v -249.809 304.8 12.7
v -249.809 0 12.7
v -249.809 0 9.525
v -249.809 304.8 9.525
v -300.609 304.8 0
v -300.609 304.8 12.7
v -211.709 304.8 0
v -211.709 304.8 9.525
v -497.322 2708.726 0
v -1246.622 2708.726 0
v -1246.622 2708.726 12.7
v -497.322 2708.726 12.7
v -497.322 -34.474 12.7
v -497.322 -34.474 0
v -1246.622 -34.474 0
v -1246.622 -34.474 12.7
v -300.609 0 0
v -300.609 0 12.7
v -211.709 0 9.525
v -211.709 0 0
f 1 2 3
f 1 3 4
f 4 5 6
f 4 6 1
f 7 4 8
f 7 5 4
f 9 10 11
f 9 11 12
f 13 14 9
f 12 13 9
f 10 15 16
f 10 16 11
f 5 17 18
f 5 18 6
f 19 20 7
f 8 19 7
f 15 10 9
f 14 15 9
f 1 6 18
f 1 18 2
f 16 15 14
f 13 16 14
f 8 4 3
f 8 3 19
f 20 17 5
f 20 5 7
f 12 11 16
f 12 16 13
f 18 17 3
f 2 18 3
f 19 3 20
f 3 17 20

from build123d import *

# Parameters (mm, degrees)
F0_W     = 749.3
F0_H     = 2743.2
F1_DEPTH = 12.7
F2_W     = 88.9
F2_H     = 304.8
F3_DEPTH = 12.7
F4_W     = 38.1
F4_H     = 304.8
F5_DEPTH = 3.175


with BuildPart() as f1:
    # F0 (on Top) → F1 (new body)
    with BuildSketch(Plane.XY):
        with Locations((-871.972486, 1337.126257)):
            Rectangle(F0_W, F0_H)
    extrude(amount=F1_DEPTH)


with BuildPart() as f3:
    # F2 (on Top) → F3 (new body)
    with BuildSketch(Plane.XY):
        with Locations((-256.158695, 152.4)):
            Rectangle(F2_W, F2_H)
    extrude(amount=F3_DEPTH)

    # F4 (on face) → F5 (cut)
    with BuildSketch(Plane.XY.offset(12.7)):
        with Locations((-230.758695, 152.4)):
            Rectangle(F4_W, F4_H)
    extrude(amount=-F5_DEPTH, mode=Mode.SUBTRACT)


solid = Compound([f1.part, f3.part])
